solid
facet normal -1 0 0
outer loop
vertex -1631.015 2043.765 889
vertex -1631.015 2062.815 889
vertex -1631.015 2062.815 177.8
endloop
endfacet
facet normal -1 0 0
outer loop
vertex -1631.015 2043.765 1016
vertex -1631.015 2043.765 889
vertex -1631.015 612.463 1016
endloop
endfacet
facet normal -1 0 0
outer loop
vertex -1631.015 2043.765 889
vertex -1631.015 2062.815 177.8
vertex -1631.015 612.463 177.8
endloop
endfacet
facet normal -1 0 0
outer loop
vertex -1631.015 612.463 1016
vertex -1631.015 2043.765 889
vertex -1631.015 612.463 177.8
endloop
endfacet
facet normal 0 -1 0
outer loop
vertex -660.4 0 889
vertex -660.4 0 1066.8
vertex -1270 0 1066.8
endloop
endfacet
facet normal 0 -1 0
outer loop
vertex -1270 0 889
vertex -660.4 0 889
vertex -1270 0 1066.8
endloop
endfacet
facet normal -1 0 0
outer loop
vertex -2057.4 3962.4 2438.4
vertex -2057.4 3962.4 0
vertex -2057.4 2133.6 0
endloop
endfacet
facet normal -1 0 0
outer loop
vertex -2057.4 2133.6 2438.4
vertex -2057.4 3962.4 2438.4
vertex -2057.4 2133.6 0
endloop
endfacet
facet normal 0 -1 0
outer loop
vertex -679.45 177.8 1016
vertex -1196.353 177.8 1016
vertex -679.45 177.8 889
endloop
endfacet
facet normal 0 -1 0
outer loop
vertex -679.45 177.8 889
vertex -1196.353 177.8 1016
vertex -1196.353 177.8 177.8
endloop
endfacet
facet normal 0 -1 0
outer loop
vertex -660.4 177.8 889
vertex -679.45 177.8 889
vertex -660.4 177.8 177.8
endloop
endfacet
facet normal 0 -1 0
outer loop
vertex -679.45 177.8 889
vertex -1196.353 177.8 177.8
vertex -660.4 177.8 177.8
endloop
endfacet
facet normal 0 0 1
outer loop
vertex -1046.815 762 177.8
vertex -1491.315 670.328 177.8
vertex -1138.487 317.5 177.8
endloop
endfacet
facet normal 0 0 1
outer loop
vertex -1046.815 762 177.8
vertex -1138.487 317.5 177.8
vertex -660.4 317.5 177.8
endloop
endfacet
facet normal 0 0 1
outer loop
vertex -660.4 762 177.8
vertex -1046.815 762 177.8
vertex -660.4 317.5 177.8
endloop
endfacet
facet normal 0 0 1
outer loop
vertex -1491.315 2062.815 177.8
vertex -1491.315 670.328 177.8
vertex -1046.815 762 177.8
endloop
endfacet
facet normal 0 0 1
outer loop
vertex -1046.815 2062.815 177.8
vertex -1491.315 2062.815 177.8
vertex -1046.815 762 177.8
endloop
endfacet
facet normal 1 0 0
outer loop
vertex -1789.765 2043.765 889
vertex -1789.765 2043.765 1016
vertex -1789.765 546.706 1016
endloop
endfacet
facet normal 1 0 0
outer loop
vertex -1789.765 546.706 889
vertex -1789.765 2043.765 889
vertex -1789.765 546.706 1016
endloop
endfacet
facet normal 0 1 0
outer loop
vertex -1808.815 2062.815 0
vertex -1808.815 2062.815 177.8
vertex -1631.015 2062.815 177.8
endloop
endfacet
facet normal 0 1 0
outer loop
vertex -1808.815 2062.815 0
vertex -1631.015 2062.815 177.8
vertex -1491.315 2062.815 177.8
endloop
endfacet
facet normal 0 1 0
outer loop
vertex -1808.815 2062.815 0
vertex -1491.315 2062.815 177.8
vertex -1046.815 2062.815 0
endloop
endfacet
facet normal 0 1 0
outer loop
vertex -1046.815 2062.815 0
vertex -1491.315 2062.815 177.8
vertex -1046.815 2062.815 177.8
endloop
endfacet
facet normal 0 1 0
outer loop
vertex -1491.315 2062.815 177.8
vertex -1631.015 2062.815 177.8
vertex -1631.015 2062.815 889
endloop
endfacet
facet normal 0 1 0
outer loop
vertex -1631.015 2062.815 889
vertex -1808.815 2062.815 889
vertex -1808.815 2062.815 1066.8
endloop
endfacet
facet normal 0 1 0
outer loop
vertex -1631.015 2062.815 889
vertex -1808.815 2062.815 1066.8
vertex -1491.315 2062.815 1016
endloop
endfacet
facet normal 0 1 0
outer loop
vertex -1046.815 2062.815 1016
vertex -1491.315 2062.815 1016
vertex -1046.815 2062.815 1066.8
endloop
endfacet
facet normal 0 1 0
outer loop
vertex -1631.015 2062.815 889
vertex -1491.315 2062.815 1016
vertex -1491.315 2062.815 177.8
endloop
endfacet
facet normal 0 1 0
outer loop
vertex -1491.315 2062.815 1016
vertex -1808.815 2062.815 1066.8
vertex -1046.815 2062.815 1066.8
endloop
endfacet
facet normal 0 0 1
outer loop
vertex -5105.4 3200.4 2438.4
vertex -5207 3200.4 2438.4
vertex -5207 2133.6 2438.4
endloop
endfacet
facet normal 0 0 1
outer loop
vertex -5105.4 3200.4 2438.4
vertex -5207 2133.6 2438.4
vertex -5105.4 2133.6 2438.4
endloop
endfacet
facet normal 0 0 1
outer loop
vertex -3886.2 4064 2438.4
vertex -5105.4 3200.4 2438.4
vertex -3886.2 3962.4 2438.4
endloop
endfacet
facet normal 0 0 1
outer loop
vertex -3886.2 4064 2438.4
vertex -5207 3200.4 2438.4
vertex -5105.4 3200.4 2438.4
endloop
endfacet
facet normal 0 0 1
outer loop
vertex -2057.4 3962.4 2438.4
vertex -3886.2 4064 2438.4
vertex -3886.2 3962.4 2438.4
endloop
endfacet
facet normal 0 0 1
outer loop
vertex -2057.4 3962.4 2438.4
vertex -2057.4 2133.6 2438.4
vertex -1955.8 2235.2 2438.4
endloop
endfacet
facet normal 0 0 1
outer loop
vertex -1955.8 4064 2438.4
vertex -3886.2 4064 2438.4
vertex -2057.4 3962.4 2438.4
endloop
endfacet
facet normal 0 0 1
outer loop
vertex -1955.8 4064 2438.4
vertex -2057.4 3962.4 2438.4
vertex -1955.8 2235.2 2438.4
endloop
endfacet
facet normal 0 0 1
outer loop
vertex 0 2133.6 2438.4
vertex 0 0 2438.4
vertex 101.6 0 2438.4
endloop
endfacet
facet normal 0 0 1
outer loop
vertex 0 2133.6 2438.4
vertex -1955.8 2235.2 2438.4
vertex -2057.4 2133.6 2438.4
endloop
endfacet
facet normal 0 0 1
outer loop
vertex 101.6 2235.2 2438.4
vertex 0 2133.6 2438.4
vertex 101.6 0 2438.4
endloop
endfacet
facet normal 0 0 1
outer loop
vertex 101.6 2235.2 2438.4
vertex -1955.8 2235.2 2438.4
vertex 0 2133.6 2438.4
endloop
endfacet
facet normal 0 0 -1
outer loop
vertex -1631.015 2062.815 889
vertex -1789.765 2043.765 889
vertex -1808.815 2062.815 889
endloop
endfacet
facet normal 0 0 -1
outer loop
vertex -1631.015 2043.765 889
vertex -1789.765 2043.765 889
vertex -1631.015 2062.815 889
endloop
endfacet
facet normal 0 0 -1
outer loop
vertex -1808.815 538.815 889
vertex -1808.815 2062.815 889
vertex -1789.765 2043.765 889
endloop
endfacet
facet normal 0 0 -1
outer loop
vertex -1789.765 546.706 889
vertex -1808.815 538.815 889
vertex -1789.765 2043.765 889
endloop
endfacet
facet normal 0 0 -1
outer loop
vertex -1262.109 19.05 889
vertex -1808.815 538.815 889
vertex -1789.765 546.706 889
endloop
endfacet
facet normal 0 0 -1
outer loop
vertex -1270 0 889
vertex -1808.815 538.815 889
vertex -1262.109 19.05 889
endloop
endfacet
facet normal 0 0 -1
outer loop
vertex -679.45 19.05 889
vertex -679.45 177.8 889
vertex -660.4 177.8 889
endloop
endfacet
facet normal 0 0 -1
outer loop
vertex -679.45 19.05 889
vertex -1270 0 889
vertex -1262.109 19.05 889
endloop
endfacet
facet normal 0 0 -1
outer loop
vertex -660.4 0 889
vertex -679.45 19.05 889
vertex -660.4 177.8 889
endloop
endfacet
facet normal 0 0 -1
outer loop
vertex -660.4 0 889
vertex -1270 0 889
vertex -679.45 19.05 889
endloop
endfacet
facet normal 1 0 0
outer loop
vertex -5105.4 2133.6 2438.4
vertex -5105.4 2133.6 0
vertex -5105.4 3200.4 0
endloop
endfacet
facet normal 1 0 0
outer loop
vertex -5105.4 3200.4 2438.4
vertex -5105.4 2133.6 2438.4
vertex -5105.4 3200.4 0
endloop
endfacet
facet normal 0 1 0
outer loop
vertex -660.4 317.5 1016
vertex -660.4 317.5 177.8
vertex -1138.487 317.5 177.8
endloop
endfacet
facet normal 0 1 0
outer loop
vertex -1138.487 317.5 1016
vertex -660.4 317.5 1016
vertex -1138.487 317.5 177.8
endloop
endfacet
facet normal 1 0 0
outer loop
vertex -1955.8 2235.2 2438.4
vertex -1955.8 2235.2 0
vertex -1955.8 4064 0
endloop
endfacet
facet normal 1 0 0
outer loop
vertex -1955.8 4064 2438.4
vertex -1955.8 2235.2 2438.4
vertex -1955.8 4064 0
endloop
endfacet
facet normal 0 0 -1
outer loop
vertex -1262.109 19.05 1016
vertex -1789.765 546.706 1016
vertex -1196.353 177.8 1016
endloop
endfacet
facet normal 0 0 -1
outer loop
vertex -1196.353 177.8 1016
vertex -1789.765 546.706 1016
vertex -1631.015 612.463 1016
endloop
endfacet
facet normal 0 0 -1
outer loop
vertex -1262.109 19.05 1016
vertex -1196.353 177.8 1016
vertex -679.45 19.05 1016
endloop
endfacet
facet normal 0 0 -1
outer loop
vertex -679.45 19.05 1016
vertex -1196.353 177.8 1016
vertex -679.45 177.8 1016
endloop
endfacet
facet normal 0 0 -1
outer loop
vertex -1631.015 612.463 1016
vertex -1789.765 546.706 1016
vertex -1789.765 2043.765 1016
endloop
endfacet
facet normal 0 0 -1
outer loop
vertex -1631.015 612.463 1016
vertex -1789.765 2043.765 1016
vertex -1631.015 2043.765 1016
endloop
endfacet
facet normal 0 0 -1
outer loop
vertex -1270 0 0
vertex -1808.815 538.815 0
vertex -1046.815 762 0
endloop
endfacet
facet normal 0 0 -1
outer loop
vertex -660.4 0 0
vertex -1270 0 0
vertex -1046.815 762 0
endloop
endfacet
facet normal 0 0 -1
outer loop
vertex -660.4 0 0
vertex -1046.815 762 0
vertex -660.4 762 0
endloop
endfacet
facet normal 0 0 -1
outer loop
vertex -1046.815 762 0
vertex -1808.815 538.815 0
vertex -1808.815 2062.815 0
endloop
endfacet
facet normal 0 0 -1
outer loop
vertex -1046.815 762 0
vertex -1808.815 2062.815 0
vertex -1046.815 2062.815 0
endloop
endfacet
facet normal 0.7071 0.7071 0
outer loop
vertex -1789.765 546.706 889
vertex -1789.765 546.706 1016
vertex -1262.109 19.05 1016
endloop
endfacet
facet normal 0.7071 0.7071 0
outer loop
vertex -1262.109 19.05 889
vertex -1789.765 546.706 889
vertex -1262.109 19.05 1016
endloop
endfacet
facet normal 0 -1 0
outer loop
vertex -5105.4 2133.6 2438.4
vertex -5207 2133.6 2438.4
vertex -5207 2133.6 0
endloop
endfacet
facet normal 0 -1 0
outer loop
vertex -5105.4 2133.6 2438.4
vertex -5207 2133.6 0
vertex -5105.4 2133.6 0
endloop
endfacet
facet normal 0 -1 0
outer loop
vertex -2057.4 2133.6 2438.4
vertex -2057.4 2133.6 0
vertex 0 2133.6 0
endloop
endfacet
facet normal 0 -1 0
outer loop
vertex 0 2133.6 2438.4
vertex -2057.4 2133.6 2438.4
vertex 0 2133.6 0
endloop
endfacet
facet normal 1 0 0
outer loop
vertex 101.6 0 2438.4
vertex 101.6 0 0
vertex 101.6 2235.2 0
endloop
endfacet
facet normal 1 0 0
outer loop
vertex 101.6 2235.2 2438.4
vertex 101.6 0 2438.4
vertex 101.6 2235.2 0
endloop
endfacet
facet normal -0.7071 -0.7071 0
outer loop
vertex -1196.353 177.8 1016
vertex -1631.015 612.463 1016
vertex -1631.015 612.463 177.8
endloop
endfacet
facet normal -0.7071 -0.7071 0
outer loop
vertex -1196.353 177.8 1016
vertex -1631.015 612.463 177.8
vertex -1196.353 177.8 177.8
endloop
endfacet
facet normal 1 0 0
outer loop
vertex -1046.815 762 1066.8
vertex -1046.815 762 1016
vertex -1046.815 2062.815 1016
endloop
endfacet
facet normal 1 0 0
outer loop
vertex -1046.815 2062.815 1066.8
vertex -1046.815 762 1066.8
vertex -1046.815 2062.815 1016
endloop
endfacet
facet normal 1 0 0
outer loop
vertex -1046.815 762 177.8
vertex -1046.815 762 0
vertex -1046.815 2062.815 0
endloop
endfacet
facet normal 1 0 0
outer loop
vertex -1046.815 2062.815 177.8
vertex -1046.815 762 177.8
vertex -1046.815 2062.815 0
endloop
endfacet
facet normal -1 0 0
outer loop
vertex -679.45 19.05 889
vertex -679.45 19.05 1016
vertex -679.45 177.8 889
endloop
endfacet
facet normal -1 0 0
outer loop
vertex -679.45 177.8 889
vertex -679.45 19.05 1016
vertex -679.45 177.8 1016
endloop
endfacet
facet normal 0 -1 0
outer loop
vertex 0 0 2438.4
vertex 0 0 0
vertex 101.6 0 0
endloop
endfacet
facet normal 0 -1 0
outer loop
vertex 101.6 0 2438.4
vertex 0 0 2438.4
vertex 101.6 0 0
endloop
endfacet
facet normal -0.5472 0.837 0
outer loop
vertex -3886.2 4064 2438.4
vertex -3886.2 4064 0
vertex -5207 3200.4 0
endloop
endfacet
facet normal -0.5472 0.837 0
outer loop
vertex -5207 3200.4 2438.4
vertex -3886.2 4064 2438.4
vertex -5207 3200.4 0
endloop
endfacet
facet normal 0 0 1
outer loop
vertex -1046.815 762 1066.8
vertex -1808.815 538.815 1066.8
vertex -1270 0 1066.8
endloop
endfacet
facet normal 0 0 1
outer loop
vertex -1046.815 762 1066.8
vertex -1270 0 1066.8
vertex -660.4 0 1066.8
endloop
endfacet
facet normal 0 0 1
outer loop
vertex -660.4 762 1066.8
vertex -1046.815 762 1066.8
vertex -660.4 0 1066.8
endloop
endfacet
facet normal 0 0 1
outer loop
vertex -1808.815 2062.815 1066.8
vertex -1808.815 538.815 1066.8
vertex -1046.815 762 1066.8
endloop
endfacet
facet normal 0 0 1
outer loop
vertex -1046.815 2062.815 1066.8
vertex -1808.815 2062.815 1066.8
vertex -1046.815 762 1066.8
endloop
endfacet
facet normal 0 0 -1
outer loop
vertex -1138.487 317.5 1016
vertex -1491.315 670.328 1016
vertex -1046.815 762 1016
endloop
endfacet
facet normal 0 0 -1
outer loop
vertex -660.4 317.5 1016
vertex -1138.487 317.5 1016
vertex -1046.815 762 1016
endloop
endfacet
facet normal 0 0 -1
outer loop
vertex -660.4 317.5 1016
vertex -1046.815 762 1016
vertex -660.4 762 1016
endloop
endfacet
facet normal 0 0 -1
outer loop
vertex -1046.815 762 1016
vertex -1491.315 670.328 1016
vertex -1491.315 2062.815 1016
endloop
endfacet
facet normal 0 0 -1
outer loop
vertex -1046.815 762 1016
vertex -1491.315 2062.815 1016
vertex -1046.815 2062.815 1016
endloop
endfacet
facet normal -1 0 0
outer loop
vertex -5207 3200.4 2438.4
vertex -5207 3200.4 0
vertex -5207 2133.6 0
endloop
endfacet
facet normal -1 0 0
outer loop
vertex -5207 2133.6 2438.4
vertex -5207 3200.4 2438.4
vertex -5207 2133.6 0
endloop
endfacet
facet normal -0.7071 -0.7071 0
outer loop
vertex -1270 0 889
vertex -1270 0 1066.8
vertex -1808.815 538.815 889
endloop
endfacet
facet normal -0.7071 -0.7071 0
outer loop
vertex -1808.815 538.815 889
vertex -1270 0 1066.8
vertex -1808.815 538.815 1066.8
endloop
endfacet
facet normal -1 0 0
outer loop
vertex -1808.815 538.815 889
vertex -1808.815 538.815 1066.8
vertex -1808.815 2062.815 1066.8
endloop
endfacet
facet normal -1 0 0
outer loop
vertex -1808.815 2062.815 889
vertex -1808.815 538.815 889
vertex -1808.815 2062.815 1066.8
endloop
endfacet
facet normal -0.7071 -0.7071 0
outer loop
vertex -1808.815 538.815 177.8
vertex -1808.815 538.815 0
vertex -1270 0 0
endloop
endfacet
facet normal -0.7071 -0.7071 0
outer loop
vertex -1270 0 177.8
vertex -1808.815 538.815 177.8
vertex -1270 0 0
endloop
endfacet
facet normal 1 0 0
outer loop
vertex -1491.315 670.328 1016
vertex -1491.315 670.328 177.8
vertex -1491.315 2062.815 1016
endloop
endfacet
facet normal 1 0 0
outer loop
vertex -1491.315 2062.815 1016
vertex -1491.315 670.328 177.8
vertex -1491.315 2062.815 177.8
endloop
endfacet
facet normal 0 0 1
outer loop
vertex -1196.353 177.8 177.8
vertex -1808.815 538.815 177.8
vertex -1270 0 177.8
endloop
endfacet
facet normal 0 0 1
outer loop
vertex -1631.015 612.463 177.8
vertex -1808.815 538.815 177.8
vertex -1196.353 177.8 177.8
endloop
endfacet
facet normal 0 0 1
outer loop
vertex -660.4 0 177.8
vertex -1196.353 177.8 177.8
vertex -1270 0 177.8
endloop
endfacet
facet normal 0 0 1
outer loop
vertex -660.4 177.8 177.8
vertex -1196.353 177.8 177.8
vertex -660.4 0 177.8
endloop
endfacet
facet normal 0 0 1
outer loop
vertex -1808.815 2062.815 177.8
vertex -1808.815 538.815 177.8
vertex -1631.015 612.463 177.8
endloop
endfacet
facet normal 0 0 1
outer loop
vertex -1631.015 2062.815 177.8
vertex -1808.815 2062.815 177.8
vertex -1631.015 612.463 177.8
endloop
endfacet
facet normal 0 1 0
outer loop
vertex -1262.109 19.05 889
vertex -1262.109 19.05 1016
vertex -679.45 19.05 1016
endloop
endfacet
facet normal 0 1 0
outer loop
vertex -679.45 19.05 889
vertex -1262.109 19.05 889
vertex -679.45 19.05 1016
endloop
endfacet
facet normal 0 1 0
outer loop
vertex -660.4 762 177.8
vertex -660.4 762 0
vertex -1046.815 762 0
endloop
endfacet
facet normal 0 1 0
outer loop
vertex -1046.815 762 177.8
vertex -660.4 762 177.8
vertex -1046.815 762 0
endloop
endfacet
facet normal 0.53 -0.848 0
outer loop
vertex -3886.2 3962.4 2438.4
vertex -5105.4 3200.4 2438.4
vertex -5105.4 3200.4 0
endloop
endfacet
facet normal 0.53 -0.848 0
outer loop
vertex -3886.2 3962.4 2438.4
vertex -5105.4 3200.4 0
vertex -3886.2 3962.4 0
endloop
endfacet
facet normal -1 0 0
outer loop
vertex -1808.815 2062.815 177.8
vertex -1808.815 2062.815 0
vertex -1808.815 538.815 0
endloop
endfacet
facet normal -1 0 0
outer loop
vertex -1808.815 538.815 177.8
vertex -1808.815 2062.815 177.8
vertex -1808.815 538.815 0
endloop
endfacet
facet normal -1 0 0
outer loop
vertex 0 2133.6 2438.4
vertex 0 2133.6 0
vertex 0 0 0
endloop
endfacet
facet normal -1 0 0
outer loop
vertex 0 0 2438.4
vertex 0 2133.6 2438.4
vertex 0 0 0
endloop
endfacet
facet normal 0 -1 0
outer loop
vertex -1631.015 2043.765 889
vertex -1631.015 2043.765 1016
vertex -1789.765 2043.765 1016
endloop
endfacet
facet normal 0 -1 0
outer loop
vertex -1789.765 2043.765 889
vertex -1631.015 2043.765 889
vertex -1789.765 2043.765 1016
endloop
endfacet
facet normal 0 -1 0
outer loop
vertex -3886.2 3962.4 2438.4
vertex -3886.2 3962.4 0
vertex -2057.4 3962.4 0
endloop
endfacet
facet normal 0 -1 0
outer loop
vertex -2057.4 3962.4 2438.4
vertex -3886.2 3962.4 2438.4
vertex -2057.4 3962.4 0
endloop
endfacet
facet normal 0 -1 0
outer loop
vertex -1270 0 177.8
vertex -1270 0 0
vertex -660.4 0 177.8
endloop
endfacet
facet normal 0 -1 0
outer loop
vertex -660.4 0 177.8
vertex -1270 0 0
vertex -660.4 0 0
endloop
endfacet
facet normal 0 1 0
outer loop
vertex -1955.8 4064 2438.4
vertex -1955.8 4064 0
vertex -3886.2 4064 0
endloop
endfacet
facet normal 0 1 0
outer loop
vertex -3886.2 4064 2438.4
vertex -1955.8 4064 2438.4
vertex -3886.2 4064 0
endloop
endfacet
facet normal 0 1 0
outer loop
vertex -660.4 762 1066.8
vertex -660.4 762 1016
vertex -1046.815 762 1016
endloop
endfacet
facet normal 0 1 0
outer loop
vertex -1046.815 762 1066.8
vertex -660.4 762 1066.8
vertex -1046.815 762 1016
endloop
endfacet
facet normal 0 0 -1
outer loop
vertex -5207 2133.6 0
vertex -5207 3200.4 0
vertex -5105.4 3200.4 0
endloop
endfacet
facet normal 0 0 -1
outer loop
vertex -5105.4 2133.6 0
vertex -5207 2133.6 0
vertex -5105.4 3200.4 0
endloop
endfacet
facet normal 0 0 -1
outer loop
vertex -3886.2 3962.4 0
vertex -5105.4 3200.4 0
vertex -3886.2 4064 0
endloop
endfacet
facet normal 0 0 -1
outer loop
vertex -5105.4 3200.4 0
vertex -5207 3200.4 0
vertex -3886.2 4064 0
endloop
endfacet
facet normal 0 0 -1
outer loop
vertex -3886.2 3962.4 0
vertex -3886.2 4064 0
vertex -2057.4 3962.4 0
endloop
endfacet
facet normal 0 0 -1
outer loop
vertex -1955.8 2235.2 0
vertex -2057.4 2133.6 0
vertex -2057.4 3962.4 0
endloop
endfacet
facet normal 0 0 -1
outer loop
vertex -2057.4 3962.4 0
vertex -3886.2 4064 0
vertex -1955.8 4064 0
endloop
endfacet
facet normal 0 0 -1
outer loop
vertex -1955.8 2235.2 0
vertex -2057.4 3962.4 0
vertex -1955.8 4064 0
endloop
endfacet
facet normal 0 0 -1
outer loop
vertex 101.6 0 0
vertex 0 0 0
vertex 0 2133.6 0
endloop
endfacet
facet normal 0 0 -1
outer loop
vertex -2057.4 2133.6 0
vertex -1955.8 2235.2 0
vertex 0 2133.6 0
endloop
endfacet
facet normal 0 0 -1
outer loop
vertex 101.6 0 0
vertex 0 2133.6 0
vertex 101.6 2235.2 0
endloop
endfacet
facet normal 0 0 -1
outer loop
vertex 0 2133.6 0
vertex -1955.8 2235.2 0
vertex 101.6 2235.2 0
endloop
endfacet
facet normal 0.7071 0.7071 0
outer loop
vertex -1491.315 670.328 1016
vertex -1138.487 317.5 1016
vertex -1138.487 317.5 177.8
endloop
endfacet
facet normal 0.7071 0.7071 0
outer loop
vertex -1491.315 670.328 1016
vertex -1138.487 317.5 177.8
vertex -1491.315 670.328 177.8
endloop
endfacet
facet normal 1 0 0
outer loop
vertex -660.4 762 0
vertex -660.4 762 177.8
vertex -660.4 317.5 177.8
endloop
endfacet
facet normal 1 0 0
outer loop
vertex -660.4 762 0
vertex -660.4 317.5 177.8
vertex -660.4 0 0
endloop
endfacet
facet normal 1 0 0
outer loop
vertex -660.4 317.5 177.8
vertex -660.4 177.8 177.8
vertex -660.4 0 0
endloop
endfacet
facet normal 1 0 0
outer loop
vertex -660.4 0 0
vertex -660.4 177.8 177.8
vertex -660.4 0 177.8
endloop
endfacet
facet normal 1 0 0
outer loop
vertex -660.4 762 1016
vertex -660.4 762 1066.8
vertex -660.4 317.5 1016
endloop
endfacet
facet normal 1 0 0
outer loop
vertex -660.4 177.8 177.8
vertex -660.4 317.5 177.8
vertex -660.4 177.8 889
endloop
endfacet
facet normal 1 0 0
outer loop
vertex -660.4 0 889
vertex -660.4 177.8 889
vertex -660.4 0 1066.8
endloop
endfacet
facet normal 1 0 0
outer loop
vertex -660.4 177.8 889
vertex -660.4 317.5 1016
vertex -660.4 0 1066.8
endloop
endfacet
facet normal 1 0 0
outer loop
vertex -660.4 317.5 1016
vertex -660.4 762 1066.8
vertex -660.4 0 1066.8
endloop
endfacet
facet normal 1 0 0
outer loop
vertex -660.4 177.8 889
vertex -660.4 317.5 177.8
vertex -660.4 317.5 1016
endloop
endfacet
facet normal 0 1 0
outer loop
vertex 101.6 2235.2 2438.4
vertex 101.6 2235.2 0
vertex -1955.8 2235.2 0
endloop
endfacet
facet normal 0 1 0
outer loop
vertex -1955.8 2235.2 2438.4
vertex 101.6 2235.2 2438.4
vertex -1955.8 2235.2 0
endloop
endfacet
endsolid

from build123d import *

# Parameters (mm, degrees)
F1_DEPTH = 2438.4
F3_DEPTH = 177.8
F5_DEPTH = 838.2
F7_DEPTH = 50.8
F9_DEPTH = 127


with BuildPart() as f1:
    # F0 (on Top) → F1 (new body)
    with BuildSketch(Plane.XY):
        Polygon((0, 2133.6), (0, 0), (101.6, 0), (101.6, 2235.2), (-1955.8, 2235.2), (-1955.8, 4064), (-3886.2, 4064), (-5207, 3200.4), (-5207, 2133.6), (-5105.4, 2133.6), (-5105.4, 3200.4), (-3886.2, 3962.4), (-2057.4, 3962.4), (-2057.4, 2133.6), align=None)
    extrude(amount=F1_DEPTH)


with BuildPart() as f3:
    # F2 (on Top) → F3 (new body)
    with BuildSketch(Plane.XY):
        Polygon((-1046.8153672641, 762), (-1046.8153672641, 2062.8153672641), (-1808.8153672641, 2062.8153672641), (-1808.8153672641, 538.8153672641), (-1270, 0), (-660.4, 0), (-660.4, 762), align=None)
    extrude(amount=F3_DEPTH)

    # F4 (on face) → F5 (join)
    with BuildSketch(Plane.XY.offset(177.8)):
        Polygon((-1491.3153672641, 2062.8153672641), (-1631.0153672641, 2062.8153672641), (-1631.0153672641, 612.4625386541), (-1196.3528286101, 177.8), (-660.4, 177.8), (-660.4, 317.5), (-1138.4871939465, 317.5), (-1491.3153672641, 670.3281733176), align=None)
    extrude(amount=F5_DEPTH)

    # F6 (on face) → F7 (join)
    with BuildSketch(Plane.XY.offset(1016)):
        Polygon((-1046.8153672641, 2062.8153672641), (-1808.8153672641, 2062.8153672641), (-1808.8153672641, 538.8153672641), (-1270, 0), (-660.4, 0), (-660.4, 762), (-1046.8153672641, 762), align=None)
    extrude(amount=F7_DEPTH)

    # F8 (on face) → F9 (join)
    with BuildSketch(Plane(origin=(0, 0, 1016), x_dir=(1, 0, 0), z_dir=(0, 0, -1))):
        Polygon((-1808.8153672641, -538.8153672641), (-1808.8153672641, -2062.8153672641), (-1631.0153672641, -2062.8153672641), (-1631.0153672641, -2043.7653672641), (-1789.7653672641, -2043.7653672641), (-1789.7653672641, -546.7061356274), (-1262.1092316368, -19.05), (-679.45, -19.05), (-679.45, -177.8), (-660.4, -177.8), (-660.4, 0), (-1270, 0), align=None)
    extrude(amount=F9_DEPTH)


solid = Compound([f1.part, f3.part])
